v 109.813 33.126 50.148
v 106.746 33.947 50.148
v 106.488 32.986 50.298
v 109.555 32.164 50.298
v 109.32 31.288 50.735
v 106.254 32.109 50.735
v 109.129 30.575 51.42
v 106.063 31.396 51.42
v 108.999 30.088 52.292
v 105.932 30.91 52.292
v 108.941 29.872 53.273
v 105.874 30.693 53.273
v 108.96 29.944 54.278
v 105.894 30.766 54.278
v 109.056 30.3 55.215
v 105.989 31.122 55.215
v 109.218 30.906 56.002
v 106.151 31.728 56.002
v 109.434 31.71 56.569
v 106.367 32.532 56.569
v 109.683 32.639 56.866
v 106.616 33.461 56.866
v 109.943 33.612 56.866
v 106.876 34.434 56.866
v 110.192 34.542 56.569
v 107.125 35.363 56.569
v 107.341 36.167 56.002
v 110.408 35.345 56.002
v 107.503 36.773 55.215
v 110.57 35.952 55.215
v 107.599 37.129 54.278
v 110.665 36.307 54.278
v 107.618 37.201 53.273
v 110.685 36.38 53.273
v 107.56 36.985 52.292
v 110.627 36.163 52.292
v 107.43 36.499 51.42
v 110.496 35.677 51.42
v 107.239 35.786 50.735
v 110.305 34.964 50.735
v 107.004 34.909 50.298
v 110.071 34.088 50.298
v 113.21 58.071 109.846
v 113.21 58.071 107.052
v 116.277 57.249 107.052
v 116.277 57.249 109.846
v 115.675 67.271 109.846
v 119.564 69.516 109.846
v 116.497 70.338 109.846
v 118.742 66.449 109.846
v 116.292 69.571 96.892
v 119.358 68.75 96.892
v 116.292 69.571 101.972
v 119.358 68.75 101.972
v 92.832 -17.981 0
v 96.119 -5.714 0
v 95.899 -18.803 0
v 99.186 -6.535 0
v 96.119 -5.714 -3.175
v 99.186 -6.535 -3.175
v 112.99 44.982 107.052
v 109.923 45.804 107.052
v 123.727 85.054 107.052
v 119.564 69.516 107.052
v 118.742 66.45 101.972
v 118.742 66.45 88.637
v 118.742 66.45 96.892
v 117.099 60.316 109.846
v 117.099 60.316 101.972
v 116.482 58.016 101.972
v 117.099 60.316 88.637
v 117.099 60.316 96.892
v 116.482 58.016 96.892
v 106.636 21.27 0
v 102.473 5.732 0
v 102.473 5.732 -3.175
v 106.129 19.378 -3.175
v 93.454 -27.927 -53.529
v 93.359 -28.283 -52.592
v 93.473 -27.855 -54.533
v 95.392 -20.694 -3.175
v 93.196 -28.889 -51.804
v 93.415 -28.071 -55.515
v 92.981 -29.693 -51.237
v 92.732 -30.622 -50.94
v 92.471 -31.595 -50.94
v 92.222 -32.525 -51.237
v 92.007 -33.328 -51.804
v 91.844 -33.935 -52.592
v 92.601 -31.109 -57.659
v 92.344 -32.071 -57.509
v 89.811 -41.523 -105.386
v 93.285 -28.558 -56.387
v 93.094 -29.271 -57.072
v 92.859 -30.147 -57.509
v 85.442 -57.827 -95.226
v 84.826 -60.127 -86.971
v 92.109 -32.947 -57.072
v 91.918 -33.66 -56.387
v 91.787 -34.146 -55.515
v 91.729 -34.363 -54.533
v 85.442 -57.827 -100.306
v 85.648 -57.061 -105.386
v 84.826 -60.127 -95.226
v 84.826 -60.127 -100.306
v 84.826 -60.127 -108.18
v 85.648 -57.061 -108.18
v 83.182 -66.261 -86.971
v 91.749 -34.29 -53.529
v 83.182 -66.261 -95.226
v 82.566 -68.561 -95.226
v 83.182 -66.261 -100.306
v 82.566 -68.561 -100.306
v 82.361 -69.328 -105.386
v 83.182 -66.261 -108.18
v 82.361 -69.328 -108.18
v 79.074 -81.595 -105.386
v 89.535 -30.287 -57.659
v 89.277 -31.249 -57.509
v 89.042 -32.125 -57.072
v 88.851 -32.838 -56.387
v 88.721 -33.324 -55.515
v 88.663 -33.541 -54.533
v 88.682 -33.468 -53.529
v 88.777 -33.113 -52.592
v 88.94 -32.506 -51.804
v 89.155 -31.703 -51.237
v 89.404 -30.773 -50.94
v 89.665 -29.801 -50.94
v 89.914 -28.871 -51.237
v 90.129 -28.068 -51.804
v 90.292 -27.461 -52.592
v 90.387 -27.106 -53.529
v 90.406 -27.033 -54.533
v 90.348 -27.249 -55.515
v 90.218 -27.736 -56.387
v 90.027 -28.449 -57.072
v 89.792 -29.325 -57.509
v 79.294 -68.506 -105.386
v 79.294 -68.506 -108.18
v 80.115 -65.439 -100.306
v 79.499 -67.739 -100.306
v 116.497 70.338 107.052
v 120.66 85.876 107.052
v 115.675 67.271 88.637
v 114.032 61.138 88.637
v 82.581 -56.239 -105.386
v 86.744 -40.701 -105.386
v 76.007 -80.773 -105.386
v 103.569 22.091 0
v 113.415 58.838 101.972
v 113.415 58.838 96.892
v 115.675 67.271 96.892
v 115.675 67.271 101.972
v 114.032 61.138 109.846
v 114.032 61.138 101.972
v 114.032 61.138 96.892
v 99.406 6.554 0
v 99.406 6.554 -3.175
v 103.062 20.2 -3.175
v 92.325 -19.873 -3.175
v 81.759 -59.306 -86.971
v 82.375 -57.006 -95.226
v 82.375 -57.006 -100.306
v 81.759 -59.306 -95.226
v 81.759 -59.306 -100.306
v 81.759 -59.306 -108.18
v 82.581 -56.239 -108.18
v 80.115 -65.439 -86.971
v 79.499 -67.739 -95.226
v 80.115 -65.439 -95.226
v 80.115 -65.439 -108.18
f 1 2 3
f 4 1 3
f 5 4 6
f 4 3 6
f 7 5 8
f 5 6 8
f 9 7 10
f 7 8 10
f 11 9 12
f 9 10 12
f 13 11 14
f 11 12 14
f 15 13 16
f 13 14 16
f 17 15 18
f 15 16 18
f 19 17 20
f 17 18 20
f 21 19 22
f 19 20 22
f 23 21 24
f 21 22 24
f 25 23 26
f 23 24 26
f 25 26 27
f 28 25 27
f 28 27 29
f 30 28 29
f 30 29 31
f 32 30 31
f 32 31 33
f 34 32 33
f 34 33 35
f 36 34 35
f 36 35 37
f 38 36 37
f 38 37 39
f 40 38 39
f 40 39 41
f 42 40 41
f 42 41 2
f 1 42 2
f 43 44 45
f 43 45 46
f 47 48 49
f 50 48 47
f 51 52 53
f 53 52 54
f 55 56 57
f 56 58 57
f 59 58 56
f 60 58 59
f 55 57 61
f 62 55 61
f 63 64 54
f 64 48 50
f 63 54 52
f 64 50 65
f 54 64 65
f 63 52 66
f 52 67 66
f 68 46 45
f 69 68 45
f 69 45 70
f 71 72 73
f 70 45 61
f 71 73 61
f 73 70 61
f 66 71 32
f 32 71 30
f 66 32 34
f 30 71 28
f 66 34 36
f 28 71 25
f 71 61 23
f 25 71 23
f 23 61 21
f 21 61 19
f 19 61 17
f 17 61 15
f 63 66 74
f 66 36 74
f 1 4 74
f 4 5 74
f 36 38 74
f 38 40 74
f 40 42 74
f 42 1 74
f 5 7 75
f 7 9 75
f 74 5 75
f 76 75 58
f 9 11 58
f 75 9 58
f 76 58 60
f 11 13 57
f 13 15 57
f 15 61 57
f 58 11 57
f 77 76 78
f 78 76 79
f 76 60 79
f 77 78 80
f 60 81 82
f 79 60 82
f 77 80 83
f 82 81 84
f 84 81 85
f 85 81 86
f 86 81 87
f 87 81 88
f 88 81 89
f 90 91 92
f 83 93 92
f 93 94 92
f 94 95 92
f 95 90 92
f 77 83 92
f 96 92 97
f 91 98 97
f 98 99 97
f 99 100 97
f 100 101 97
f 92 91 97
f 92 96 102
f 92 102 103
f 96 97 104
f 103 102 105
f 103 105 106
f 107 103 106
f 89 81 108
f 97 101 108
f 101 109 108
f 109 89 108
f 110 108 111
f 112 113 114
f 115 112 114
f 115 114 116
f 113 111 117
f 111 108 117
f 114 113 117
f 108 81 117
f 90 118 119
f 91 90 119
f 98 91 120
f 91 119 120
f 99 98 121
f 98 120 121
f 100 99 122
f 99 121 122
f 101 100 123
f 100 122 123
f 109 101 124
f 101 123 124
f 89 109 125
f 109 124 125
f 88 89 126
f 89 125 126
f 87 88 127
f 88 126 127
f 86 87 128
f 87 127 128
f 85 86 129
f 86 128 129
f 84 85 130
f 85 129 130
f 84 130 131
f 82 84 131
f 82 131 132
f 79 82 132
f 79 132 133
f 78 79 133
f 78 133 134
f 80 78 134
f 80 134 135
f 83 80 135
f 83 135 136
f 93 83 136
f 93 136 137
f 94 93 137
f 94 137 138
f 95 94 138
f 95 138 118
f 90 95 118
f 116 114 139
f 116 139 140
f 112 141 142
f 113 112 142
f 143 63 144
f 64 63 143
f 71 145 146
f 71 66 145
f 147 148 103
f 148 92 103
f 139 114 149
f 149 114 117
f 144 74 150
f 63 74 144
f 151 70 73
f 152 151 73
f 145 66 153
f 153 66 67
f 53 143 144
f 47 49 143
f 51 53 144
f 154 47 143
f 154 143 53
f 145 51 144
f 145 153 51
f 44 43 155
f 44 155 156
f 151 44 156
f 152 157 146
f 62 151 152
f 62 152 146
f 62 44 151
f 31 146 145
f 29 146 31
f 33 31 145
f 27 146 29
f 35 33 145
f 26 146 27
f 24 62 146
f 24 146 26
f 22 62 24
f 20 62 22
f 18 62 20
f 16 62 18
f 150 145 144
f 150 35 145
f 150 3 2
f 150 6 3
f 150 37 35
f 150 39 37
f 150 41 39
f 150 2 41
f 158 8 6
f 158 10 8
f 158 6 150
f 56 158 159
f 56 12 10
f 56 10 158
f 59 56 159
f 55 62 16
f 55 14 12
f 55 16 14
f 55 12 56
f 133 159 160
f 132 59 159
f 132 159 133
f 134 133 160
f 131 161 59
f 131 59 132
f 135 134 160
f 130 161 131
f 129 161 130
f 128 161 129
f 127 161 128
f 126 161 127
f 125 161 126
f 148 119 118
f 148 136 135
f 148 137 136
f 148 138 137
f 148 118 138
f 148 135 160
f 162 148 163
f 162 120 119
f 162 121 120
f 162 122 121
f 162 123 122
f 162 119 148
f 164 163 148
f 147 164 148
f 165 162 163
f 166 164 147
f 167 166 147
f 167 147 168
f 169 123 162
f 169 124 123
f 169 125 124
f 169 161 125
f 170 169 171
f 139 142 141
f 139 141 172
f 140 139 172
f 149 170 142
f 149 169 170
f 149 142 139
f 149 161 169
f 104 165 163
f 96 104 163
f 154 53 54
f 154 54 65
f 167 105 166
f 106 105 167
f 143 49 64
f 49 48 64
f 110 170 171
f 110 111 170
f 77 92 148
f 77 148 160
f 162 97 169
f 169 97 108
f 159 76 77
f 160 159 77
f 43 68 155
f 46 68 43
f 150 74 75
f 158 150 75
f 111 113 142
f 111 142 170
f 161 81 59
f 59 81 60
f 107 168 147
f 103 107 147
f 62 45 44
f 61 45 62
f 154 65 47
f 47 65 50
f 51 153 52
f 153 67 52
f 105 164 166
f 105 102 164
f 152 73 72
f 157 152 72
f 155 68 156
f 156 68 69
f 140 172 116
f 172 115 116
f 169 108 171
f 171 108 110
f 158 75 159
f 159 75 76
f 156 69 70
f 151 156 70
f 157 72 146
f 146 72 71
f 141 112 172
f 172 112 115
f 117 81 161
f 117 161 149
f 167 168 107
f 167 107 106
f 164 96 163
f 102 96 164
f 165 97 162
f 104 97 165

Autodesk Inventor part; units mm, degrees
ref_plane "YZ Plane" through (0, 0, 0) normal (1, 0, 0) x (0, 1, 0)
ref_plane "XZ Plane" through (0, 0, 0) normal (0, 1, 0) x (-1, 0, 0)
ref_plane "Work Plane1" through (111.7581, 40.3852, 111.4201) normal (-0.9659258, 0.258819, 0) x (-0.1358803, -0.507112, -0.8511016)
sketch "Sketch1" plane through (111.7581, 40.3852, 111.4201) normal (-0.9659258, 0.258819, 0) x (-0.1358803, -0.507112, -0.8511016)
  line L0 (0, -6.3437) -> (253.9995, -6.3437) construction
  line L1 (228.4809, -42.564) -> (250.8233, -6.3437) construction
  line L2 (108.9501, -41.6524) -> (130.3466, -6.9656) construction
  line L3 (107.0353, -38.7089) -> (126.9998, -6.3437) construction
  line L4 (-20.5605, -41.6524) -> (-3.3186, -13.7009) construction
  line L5 (-4.9348, -10.2733) -> (-23.2434, -39.9543) construction
  line L6 (-3.3186, -13.7009) -> (1.2196, -6.3437) construction
  line L7 (130.3466, -6.9656) -> (130.7302, -6.3437) construction
  line L8 (130.7302, -6.3437) -> (250.8233, -6.3437)
  line L9 (126.9998, -6.3437) -> (1.2196, -6.3437)
  line L10 (-20.5605, -41.6524) -> (108.9501, -41.6524) construction
  line L11 (108.9501, -41.6524) -> (232.7736, -41.6524) construction
  line L12 (107.0353, -38.7089) -> (105.2196, -41.6524) construction
  line L13 (229.0432, -41.6524) -> (250.8233, -6.3437)
  line L14 (229.0432, -41.6524) -> (108.9501, -41.6524)
  line L15 (130.7302, -6.3437) -> (108.9501, -41.6524)
  line L16 (105.2196, -41.6524) -> (126.9998, -6.3437)
  line L17 (105.2196, -41.6524) -> (-20.5605, -41.6524)
  line L18 (-20.5605, -41.6524) -> (1.2196, -6.3437)
  line L19 (120.3322, -17.1527) -> (123.0345, -18.8196)
  line L20 (113.6647, -27.9617) -> (116.367, -29.6286)
  line L21 (244.1558, -17.1527) -> (246.8581, -18.8196)
  line L22 (246.8581, -18.8196) -> (240.1905, -29.6286)
  line L23 (240.1905, -29.6286) -> (237.4883, -27.9617)
  line L24 (-5.4479, -17.1527) -> (-8.1501, -15.4858)
  line L25 (-8.1501, -15.4858) -> (-14.8176, -26.2948)
  line L26 (-14.8176, -26.2948) -> (-12.1154, -27.9617)
  line L27 (256.5554, -3.0988) -> (232.2107, -42.5651) construction
  line L28 (105.2196, -41.6524) -> (134.1991, 5.3274) construction
  line L29 (136.9013, 3.6606) -> (107.9219, -43.3193) construction
  line L30 (12.8127, 12.4503) -> (-20.8503, -42.1222) construction
  line L31 (-23.5525, -40.4553) -> (10.1104, 14.1172) construction
  line L32 (256.5554, -3.0988) -> (232.2107, -42.5651) construction
  line L33 (237.4883, -27.9617) -> (229.5084, -40.8982) construction
  line L34 (250.8233, -6.3437) -> (244.1558, -17.1527) construction
  point P0 (126.9998, -6.3437)
  dimension "d0" = 12.7
  dimension "d1" = 12.7
  dimension "d2" = 12.7
  dimension "d3" = 12.7
  dimension "d4" = 12.7
  dimension "d5" = 12.7
extrude "Extrusion1" add sketch "Sketch1" along normal blind 3.175
sketch "Sketch2" plane through (111.7581, 40.3852, 111.4201) normal (0.9659258, -0.258819, 0) x (-0.1358803, -0.507112, -0.8511016)
  line L0 (-20.5605, 41.6524) -> (105.2196, 41.6524) construction
  line L1 (42.3296, 41.6524) -> (64.1097, 6.3437) construction
  line L2 (126.9998, 6.3437) -> (1.2196, 6.3437) construction
  line L3 (108.9501, 41.6524) -> (229.0432, 41.6524) construction
  line L4 (168.9966, 41.6524) -> (190.7768, 6.3437) construction
  line L5 (250.8233, 6.3437) -> (130.7302, 6.3437) construction
  point P0 (130.4954, 0.6768)
  point P1 (53.2196, 23.9981)
  point P2 (179.8867, 23.9981)
hole "Hole1" at (109.8129, 33.1257, 53.5258) at (92.6013, -31.1087, -54.2807) direction (-0.9659258, 0.258819, 0) diameter 6.7564 depth 13.6144 clearance for "Flat Head Machine Screw (82)" size "1/4" standard "Ansi Unified Screw Threads"
sketch "Sketch3" plane through (111.7581, 40.3852, 111.4201) normal (0.9659258, -0.258819, 0) x (-0.1358803, -0.507112, -0.8511016)
  line L0 (-8.1501, 15.4858) -> (-14.8176, 26.2948) projected
  line L1 (-11.4839, 20.8903) -> (6.8914, 32.2251) construction
  line L2 (5.2245, 34.9273) -> (-13.1507, 23.5925)
  line L3 (-8.1501, 15.4858) -> (-14.8176, 26.2948) projected
  line L4 (-9.817, 18.1881) -> (8.5583, 29.5228)
  line L5 (2.7826, 23.1623) -> (-3.0515, 32.6201)
  line L6 (-3.0515, 32.6201) -> (-7.3751, 29.9531)
  line L7 (-7.3751, 29.9531) -> (-1.541, 20.4953)
  line L8 (-1.541, 20.4953) -> (2.7826, 23.1623)
  line L9 (-7.3751, 29.9531) -> (2.7826, 23.1623) construction
  line L10 (240.1905, 29.6286) -> (246.8581, 18.8196) projected
  line L11 (243.5243, 24.2241) -> (225.149, 12.8893) construction
  line L12 (5.2245, 34.9273) -> (8.5583, 29.5228)
  line L13 (223.4821, 15.5915) -> (226.8159, 10.187)
  line L14 (226.8159, 10.187) -> (245.1912, 21.5218)
  line L15 (223.4821, 15.5915) -> (241.8574, 26.9263)
  line L16 (239.4155, 15.1612) -> (235.0919, 12.4942)
  line L17 (235.0919, 12.4942) -> (229.2578, 21.9521)
  line L18 (229.2578, 21.9521) -> (233.5814, 24.6191)
  line L19 (233.5814, 24.6191) -> (239.4155, 15.1612)
  line L20 (239.4155, 15.1612) -> (229.2578, 21.9521) construction
  line L21 (-14.4934, 26.4948) -> (-7.8258, 15.6858)
  line L22 (-14.8176, 26.2948) -> (-12.1154, 27.9617) projected
  line L23 (-5.4479, 17.1527) -> (-8.1501, 15.4858) projected
  line L24 (239.8663, 29.4285) -> (246.584, 18.5381)
  line L25 (246.8581, 18.8196) -> (244.1558, 17.1527) projected
  line L26 (237.4883, 27.9617) -> (240.1905, 29.6286) projected
  point P0 (130.4954, 0.6768)
  point P1 (-2.2962, 26.5577)
  point P2 (234.3367, 18.5567)
  point P3 (1.5325, 25.1889)
  point P4 (-1.8013, 30.5934)
  point P5 (-6.1249, 27.9264)
  point P6 (-9.817, 18.1881)
  point P7 (-2.7911, 22.5219)
  point P8 (238.1653, 17.1879)
  point P9 (234.8316, 22.5924)
  point P10 (230.508, 19.9254)
  point P11 (233.8417, 14.5209)
  point P12 (241.5332, 26.7263)
  point P13 (246.5338, 18.6195)
  point P14 (244.8669, 21.3218)
  point P15 (-12.8265, 23.7926)
  point P16 (-9.4927, 18.3881)
  dimension "d16" = 21.59
  dimension "d19" = 11.1125
  dimension "d20" = 5.08
  dimension "d21" = 21.59
  dimension "d22" = 6.35
  dimension "d23" = 6.35
  dimension "d24" = 5.08
  dimension "d25" = 11.1125
  dimension "d28" = 0.381
  dimension "d29" = 0.381
extrude "Extrusion2" cut sketch "Sketch3" against normal through all
properties part number "SidePlate" material "Aluminum 6061"
